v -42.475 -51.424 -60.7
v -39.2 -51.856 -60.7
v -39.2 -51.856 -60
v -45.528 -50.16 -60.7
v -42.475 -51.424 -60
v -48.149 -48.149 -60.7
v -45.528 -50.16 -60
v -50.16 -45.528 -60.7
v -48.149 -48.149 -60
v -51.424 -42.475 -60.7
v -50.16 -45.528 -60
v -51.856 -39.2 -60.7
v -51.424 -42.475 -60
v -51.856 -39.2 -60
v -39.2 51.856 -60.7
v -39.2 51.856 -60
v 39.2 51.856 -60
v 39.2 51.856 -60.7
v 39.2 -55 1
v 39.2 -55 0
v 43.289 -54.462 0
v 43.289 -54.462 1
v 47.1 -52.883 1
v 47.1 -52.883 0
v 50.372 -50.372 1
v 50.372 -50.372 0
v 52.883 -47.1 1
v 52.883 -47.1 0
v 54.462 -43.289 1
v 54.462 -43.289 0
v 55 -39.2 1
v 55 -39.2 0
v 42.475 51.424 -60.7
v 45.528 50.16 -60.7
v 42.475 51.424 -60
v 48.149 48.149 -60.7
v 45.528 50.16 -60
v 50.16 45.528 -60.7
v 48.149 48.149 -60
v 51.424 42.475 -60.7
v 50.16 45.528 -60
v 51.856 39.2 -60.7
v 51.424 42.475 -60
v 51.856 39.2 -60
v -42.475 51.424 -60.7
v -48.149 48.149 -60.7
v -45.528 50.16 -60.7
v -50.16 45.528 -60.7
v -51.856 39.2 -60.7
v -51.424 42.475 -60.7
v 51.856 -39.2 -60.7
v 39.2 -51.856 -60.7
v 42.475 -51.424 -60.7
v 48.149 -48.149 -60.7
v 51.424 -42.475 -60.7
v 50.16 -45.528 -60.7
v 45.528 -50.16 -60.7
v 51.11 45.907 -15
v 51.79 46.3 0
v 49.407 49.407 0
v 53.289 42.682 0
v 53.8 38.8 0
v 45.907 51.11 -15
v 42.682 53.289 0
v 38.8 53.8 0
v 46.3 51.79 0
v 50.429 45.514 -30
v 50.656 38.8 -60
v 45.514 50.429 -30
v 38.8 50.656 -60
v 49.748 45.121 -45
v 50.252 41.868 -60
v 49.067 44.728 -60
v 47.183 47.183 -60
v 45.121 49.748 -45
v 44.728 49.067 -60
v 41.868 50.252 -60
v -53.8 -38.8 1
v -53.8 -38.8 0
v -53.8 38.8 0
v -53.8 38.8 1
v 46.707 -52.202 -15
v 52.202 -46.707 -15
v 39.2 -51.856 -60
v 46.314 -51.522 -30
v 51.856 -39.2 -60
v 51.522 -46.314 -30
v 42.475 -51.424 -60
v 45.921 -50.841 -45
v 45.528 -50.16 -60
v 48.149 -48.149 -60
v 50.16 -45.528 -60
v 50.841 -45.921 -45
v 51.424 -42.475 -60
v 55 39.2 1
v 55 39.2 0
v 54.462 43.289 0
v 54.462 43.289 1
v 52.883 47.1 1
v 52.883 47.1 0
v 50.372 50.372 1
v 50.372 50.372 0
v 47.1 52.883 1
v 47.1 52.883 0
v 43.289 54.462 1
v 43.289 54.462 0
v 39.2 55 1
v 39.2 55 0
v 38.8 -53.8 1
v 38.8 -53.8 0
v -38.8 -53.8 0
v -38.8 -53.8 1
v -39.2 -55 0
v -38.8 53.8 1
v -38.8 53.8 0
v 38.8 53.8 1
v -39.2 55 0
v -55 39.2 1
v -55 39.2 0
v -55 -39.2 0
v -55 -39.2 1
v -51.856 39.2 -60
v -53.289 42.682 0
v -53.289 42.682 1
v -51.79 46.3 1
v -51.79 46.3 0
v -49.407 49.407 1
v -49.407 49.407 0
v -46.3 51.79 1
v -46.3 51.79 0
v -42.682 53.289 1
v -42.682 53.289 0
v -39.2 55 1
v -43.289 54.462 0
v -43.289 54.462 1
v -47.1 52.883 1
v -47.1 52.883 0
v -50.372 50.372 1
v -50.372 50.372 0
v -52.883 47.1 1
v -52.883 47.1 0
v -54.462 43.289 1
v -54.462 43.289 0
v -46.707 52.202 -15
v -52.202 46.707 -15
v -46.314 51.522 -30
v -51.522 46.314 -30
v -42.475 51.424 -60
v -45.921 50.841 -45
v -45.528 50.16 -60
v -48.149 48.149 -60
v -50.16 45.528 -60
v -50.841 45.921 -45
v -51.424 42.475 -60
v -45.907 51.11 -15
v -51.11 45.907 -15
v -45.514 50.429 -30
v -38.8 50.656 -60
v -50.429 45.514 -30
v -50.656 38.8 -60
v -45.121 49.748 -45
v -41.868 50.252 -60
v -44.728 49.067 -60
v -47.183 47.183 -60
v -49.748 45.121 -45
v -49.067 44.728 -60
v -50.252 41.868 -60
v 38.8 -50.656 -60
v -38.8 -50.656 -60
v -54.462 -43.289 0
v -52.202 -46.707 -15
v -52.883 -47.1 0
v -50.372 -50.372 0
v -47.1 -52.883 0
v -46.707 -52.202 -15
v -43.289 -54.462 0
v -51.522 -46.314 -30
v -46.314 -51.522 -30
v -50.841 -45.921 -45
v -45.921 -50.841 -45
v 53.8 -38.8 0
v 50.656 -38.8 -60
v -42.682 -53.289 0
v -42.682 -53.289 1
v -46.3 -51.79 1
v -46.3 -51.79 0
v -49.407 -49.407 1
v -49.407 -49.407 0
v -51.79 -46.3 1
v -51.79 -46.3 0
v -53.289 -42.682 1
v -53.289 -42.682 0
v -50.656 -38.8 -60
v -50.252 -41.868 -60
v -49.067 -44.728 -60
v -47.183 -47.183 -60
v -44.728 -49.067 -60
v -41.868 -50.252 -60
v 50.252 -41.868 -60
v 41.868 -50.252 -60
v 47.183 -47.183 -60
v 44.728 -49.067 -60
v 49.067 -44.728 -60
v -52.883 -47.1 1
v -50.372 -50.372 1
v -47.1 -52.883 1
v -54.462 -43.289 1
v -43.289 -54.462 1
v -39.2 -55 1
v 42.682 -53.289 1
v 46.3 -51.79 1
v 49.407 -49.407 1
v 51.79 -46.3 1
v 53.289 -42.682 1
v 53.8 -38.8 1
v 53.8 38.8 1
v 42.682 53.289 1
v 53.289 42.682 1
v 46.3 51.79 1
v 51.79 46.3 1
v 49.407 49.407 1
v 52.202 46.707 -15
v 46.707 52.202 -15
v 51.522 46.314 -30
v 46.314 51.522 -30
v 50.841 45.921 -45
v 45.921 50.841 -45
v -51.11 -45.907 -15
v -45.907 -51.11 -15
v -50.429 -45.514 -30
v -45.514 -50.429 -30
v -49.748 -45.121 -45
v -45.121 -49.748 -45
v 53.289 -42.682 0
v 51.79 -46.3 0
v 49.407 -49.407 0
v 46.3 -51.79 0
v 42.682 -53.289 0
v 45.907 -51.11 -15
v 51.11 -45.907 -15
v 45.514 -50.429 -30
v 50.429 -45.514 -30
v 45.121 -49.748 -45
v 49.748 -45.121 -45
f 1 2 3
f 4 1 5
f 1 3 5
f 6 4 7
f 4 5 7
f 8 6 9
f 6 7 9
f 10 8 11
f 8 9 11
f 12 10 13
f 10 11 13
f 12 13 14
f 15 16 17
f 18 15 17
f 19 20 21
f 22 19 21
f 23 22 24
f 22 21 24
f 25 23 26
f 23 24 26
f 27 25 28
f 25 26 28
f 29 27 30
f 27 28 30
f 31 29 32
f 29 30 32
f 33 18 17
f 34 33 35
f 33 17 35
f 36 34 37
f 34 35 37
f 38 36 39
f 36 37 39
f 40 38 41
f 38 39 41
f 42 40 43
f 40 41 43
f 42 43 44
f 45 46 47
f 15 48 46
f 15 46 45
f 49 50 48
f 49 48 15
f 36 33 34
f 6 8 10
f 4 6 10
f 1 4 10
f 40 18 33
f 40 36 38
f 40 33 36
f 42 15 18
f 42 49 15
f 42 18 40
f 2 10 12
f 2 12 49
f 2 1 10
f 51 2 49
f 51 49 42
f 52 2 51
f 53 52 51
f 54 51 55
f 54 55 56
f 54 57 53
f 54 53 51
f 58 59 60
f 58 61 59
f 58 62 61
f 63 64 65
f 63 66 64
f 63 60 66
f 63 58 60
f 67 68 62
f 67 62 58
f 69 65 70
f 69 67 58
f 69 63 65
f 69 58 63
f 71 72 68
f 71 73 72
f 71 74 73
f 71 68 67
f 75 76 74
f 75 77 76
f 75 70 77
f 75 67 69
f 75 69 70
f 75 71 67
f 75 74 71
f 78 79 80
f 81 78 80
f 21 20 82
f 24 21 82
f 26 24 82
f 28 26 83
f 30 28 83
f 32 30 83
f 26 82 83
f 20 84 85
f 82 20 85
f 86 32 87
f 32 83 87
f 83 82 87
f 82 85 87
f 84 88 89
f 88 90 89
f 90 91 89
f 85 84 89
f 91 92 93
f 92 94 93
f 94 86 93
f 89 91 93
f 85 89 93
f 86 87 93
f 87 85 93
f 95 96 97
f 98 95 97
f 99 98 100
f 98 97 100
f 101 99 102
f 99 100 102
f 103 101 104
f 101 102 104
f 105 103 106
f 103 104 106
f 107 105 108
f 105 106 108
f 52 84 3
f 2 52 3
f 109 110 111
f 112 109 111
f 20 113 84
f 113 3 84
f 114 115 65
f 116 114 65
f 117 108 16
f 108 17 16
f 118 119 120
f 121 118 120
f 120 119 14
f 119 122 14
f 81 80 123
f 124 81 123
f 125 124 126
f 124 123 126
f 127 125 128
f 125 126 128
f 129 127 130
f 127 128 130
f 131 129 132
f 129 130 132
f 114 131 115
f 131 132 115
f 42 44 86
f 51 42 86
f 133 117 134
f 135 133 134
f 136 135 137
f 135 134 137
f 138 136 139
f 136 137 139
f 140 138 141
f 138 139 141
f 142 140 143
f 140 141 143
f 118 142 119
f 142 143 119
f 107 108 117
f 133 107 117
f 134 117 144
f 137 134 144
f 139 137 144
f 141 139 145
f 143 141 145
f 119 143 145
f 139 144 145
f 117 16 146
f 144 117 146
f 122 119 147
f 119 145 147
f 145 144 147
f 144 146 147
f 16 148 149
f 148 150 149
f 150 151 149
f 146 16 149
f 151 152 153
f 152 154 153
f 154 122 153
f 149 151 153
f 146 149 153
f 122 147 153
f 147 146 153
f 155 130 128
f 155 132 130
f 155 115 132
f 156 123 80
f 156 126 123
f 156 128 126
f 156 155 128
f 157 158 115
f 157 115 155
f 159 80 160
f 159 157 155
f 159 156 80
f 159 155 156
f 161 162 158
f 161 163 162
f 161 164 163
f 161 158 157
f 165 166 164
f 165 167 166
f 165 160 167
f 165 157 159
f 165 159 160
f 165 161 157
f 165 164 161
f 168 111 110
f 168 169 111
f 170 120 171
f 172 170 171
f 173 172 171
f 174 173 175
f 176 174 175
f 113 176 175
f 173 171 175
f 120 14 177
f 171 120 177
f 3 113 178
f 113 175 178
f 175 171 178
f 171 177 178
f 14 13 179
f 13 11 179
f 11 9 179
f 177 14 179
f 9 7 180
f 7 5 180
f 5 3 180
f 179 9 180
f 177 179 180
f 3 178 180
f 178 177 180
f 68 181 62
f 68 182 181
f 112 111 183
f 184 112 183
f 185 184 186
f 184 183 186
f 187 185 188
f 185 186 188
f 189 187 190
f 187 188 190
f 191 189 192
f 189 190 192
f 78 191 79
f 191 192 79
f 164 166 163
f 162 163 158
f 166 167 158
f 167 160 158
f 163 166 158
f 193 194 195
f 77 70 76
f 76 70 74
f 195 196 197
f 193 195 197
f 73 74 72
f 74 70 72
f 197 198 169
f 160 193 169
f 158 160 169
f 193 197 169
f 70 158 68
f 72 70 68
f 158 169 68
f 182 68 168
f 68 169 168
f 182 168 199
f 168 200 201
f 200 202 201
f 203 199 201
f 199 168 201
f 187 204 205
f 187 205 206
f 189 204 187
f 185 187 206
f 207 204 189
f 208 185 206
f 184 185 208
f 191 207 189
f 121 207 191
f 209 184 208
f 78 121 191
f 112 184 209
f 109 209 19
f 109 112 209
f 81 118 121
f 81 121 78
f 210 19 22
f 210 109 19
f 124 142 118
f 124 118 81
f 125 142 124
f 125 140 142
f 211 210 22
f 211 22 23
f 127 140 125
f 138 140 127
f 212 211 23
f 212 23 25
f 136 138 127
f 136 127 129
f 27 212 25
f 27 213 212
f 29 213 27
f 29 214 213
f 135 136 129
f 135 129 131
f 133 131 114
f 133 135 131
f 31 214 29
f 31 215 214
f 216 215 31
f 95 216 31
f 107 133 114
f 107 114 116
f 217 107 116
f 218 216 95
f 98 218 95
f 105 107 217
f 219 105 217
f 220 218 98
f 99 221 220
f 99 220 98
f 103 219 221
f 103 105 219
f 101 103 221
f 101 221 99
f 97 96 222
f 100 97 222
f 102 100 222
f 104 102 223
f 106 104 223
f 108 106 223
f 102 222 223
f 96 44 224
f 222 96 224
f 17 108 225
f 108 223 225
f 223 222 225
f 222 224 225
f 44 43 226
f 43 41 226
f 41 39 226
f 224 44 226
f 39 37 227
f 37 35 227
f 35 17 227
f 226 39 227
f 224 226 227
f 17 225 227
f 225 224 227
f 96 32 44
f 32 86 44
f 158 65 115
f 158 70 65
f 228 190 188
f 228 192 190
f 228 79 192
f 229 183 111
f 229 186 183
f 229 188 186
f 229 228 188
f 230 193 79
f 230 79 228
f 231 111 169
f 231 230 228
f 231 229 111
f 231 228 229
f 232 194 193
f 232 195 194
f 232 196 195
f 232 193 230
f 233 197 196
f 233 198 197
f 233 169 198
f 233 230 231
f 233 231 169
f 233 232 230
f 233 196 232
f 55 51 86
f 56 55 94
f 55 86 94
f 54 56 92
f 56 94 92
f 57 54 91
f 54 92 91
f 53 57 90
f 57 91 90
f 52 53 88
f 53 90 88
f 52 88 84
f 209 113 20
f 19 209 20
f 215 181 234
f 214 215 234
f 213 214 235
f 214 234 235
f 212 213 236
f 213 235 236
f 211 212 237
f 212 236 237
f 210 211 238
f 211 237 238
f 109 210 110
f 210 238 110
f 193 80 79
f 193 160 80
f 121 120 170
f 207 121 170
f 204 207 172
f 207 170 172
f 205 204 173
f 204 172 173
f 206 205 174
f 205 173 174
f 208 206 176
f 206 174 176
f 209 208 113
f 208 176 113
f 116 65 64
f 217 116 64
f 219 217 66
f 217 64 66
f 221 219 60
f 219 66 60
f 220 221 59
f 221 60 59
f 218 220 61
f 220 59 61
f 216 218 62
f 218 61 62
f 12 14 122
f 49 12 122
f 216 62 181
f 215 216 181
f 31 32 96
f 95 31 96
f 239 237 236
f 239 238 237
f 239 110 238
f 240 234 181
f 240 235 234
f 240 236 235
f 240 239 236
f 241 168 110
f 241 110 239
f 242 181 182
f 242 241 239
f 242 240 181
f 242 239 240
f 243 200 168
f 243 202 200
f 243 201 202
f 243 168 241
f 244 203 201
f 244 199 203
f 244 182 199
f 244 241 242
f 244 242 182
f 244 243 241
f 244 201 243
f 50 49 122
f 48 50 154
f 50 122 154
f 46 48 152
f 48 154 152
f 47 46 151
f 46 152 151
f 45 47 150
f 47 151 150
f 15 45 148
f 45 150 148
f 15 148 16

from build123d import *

# Parameters (mm, degrees)
F1_DEPTH = 1
F2_DEPTH = 60
F2_TAPER = 3
F3_DEPTH = 60
F3_TAPER = 3
F5_DEPTH = 0.7


with BuildPart() as f1:
    # F0 (on Top) → F1 (new body)
    with BuildSketch(Plane.XY):
        with BuildLine():
            Line((39.2, 55), (-39.2, 55))
            ThreePointArc((-39.2, 55), (-50.3722871427, 50.3722871427), (-55, 39.2))
            Line((-55, 39.2), (-55, -39.2))
            ThreePointArc((-55, -39.2), (-50.3722871427, -50.3722871427), (-39.2, -55))
            Line((-39.2, -55), (39.2, -55))
            ThreePointArc((39.2, -55), (50.3722871427, -50.3722871427), (55, -39.2))
            Line((55, -39.2), (55, 39.2))
            ThreePointArc((55, 39.2), (50.3722871427, 50.3722871427), (39.2, 55))
        make_face()
        with BuildLine():
            ThreePointArc((-53.8, 38.8), (-49.4066017178, 49.4066017178), (-38.8, 53.8))
            Line((-38.8, 53.8), (38.8, 53.8))
            ThreePointArc((38.8, 53.8), (49.4066017178, 49.4066017178), (53.8, 38.8))
            Line((53.8, 38.8), (53.8, -38.8))
            ThreePointArc((53.8, -38.8), (49.4066017178, -49.4066017178), (38.8, -53.8))
            Line((38.8, -53.8), (-38.8, -53.8))
            ThreePointArc((-38.8, -53.8), (-49.4066017178, -49.4066017178), (-53.8, -38.8))
            Line((-53.8, -38.8), (-53.8, 38.8))
        make_face(mode=Mode.SUBTRACT)
    extrude(amount=F1_DEPTH)

    # F0 (on Top) → F2 (join)
    with BuildSketch(Plane.XY):
        with BuildLine():
            Line((39.2, 55), (-39.2, 55))
            ThreePointArc((-39.2, 55), (-50.3722871427, 50.3722871427), (-55, 39.2))
            Line((-55, 39.2), (-55, -39.2))
            ThreePointArc((-55, -39.2), (-50.3722871427, -50.3722871427), (-39.2, -55))
            Line((-39.2, -55), (39.2, -55))
            ThreePointArc((39.2, -55), (50.3722871427, -50.3722871427), (55, -39.2))
            Line((55, -39.2), (55, 39.2))
            ThreePointArc((55, 39.2), (50.3722871427, 50.3722871427), (39.2, 55))
        make_face()
        with BuildLine():
            ThreePointArc((-53.8, 38.8), (-49.4066017178, 49.4066017178), (-38.8, 53.8))
            Line((-38.8, 53.8), (38.8, 53.8))
            ThreePointArc((38.8, 53.8), (49.4066017178, 49.4066017178), (53.8, 38.8))
            Line((53.8, 38.8), (53.8, -38.8))
            ThreePointArc((53.8, -38.8), (49.4066017178, -49.4066017178), (38.8, -53.8))
            Line((38.8, -53.8), (-38.8, -53.8))
            ThreePointArc((-38.8, -53.8), (-49.4066017178, -49.4066017178), (-53.8, -38.8))
            Line((-53.8, -38.8), (-53.8, 38.8))
        make_face(mode=Mode.SUBTRACT)
        with BuildLine():
            Line((38.8, 53.8), (-38.8, 53.8))
            ThreePointArc((-38.8, 53.8), (-49.4066017178, 49.4066017178), (-53.8, 38.8))
            Line((-53.8, 38.8), (-53.8, -38.8))
            ThreePointArc((-53.8, -38.8), (-49.4066017178, -49.4066017178), (-38.8, -53.8))
            Line((-38.8, -53.8), (38.8, -53.8))
            ThreePointArc((38.8, -53.8), (49.4066017178, -49.4066017178), (53.8, -38.8))
            Line((53.8, -38.8), (53.8, 38.8))
            ThreePointArc((53.8, 38.8), (49.4066017178, 49.4066017178), (38.8, 53.8))
        make_face()
    extrude(amount=-F2_DEPTH, taper=F2_TAPER)

    # F0 (on Top) → F3 (cut)
    with BuildSketch(Plane.XY):
        with BuildLine():
            Line((38.8, 53.8), (-38.8, 53.8))
            ThreePointArc((-38.8, 53.8), (-49.4066017178, 49.4066017178), (-53.8, 38.8))
            Line((-53.8, 38.8), (-53.8, -38.8))
            ThreePointArc((-53.8, -38.8), (-49.4066017178, -49.4066017178), (-38.8, -53.8))
            Line((-38.8, -53.8), (38.8, -53.8))
            ThreePointArc((38.8, -53.8), (49.4066017178, -49.4066017178), (53.8, -38.8))
            Line((53.8, -38.8), (53.8, 38.8))
            ThreePointArc((53.8, 38.8), (49.4066017178, 49.4066017178), (38.8, 53.8))
        make_face()
    extrude(amount=-F3_DEPTH, taper=F3_TAPER, mode=Mode.SUBTRACT)

    # F4 (on face) → F5 (join)
    with BuildSketch(Plane(origin=(0, 0, -60), x_dir=(1, 0, 0), z_dir=(0, 0, -1))):
        with BuildLine():
            ThreePointArc((39.2, -51.855533243), (48.1488133757, -48.1488133757), (51.855533243, -39.2))
            Line((51.855533243, -39.2), (51.855533243, 39.2))
            ThreePointArc((51.855533243, 39.2), (48.1488133757, 48.1488133757), (39.2, 51.855533243))
            Line((39.2, 51.855533243), (-39.2, 51.855533243))
            ThreePointArc((-39.2, 51.855533243), (-48.1488133757, 48.1488133757), (-51.855533243, 39.2))
            Line((-51.855533243, 39.2), (-51.855533243, -39.2))
            ThreePointArc((-51.855533243, -39.2), (-48.1488133757, -48.1488133757), (-39.2, -51.855533243))
            Line((-39.2, -51.855533243), (39.2, -51.855533243))
        make_face()
        with BuildLine():
            ThreePointArc((50.655533243, -38.8), (47.1831279507, -47.1831279507), (38.8, -50.655533243))
            Line((38.8, -50.655533243), (-38.8, -50.655533243))
            ThreePointArc((-38.8, -50.655533243), (-47.1831279507, -47.1831279507), (-50.655533243, -38.8))
            Line((-50.655533243, -38.8), (-50.655533243, 38.8))
            ThreePointArc((-50.655533243, 38.8), (-47.1831279507, 47.1831279507), (-38.8, 50.655533243))
            Line((-38.8, 50.655533243), (38.8, 50.655533243))
            ThreePointArc((38.8, 50.655533243), (47.1831279507, 47.1831279507), (50.655533243, 38.8))
            Line((50.655533243, 38.8), (50.655533243, -38.8))
        make_face(mode=Mode.SUBTRACT)
        with BuildLine():
            Line((-38.8, -50.655533243), (38.8, -50.655533243))
            ThreePointArc((38.8, -50.655533243), (47.1831279507, -47.1831279507), (50.655533243, -38.8))
            Line((50.655533243, -38.8), (50.655533243, 38.8))
            ThreePointArc((50.655533243, 38.8), (47.1831279507, 47.1831279507), (38.8, 50.655533243))
            Line((38.8, 50.655533243), (-38.8, 50.655533243))
            ThreePointArc((-38.8, 50.655533243), (-47.1831279507, 47.1831279507), (-50.655533243, 38.8))
            Line((-50.655533243, 38.8), (-50.655533243, -38.8))
            ThreePointArc((-50.655533243, -38.8), (-47.1831279507, -47.1831279507), (-38.8, -50.655533243))
        make_face()
    extrude(amount=F5_DEPTH)


solid = f1.part
